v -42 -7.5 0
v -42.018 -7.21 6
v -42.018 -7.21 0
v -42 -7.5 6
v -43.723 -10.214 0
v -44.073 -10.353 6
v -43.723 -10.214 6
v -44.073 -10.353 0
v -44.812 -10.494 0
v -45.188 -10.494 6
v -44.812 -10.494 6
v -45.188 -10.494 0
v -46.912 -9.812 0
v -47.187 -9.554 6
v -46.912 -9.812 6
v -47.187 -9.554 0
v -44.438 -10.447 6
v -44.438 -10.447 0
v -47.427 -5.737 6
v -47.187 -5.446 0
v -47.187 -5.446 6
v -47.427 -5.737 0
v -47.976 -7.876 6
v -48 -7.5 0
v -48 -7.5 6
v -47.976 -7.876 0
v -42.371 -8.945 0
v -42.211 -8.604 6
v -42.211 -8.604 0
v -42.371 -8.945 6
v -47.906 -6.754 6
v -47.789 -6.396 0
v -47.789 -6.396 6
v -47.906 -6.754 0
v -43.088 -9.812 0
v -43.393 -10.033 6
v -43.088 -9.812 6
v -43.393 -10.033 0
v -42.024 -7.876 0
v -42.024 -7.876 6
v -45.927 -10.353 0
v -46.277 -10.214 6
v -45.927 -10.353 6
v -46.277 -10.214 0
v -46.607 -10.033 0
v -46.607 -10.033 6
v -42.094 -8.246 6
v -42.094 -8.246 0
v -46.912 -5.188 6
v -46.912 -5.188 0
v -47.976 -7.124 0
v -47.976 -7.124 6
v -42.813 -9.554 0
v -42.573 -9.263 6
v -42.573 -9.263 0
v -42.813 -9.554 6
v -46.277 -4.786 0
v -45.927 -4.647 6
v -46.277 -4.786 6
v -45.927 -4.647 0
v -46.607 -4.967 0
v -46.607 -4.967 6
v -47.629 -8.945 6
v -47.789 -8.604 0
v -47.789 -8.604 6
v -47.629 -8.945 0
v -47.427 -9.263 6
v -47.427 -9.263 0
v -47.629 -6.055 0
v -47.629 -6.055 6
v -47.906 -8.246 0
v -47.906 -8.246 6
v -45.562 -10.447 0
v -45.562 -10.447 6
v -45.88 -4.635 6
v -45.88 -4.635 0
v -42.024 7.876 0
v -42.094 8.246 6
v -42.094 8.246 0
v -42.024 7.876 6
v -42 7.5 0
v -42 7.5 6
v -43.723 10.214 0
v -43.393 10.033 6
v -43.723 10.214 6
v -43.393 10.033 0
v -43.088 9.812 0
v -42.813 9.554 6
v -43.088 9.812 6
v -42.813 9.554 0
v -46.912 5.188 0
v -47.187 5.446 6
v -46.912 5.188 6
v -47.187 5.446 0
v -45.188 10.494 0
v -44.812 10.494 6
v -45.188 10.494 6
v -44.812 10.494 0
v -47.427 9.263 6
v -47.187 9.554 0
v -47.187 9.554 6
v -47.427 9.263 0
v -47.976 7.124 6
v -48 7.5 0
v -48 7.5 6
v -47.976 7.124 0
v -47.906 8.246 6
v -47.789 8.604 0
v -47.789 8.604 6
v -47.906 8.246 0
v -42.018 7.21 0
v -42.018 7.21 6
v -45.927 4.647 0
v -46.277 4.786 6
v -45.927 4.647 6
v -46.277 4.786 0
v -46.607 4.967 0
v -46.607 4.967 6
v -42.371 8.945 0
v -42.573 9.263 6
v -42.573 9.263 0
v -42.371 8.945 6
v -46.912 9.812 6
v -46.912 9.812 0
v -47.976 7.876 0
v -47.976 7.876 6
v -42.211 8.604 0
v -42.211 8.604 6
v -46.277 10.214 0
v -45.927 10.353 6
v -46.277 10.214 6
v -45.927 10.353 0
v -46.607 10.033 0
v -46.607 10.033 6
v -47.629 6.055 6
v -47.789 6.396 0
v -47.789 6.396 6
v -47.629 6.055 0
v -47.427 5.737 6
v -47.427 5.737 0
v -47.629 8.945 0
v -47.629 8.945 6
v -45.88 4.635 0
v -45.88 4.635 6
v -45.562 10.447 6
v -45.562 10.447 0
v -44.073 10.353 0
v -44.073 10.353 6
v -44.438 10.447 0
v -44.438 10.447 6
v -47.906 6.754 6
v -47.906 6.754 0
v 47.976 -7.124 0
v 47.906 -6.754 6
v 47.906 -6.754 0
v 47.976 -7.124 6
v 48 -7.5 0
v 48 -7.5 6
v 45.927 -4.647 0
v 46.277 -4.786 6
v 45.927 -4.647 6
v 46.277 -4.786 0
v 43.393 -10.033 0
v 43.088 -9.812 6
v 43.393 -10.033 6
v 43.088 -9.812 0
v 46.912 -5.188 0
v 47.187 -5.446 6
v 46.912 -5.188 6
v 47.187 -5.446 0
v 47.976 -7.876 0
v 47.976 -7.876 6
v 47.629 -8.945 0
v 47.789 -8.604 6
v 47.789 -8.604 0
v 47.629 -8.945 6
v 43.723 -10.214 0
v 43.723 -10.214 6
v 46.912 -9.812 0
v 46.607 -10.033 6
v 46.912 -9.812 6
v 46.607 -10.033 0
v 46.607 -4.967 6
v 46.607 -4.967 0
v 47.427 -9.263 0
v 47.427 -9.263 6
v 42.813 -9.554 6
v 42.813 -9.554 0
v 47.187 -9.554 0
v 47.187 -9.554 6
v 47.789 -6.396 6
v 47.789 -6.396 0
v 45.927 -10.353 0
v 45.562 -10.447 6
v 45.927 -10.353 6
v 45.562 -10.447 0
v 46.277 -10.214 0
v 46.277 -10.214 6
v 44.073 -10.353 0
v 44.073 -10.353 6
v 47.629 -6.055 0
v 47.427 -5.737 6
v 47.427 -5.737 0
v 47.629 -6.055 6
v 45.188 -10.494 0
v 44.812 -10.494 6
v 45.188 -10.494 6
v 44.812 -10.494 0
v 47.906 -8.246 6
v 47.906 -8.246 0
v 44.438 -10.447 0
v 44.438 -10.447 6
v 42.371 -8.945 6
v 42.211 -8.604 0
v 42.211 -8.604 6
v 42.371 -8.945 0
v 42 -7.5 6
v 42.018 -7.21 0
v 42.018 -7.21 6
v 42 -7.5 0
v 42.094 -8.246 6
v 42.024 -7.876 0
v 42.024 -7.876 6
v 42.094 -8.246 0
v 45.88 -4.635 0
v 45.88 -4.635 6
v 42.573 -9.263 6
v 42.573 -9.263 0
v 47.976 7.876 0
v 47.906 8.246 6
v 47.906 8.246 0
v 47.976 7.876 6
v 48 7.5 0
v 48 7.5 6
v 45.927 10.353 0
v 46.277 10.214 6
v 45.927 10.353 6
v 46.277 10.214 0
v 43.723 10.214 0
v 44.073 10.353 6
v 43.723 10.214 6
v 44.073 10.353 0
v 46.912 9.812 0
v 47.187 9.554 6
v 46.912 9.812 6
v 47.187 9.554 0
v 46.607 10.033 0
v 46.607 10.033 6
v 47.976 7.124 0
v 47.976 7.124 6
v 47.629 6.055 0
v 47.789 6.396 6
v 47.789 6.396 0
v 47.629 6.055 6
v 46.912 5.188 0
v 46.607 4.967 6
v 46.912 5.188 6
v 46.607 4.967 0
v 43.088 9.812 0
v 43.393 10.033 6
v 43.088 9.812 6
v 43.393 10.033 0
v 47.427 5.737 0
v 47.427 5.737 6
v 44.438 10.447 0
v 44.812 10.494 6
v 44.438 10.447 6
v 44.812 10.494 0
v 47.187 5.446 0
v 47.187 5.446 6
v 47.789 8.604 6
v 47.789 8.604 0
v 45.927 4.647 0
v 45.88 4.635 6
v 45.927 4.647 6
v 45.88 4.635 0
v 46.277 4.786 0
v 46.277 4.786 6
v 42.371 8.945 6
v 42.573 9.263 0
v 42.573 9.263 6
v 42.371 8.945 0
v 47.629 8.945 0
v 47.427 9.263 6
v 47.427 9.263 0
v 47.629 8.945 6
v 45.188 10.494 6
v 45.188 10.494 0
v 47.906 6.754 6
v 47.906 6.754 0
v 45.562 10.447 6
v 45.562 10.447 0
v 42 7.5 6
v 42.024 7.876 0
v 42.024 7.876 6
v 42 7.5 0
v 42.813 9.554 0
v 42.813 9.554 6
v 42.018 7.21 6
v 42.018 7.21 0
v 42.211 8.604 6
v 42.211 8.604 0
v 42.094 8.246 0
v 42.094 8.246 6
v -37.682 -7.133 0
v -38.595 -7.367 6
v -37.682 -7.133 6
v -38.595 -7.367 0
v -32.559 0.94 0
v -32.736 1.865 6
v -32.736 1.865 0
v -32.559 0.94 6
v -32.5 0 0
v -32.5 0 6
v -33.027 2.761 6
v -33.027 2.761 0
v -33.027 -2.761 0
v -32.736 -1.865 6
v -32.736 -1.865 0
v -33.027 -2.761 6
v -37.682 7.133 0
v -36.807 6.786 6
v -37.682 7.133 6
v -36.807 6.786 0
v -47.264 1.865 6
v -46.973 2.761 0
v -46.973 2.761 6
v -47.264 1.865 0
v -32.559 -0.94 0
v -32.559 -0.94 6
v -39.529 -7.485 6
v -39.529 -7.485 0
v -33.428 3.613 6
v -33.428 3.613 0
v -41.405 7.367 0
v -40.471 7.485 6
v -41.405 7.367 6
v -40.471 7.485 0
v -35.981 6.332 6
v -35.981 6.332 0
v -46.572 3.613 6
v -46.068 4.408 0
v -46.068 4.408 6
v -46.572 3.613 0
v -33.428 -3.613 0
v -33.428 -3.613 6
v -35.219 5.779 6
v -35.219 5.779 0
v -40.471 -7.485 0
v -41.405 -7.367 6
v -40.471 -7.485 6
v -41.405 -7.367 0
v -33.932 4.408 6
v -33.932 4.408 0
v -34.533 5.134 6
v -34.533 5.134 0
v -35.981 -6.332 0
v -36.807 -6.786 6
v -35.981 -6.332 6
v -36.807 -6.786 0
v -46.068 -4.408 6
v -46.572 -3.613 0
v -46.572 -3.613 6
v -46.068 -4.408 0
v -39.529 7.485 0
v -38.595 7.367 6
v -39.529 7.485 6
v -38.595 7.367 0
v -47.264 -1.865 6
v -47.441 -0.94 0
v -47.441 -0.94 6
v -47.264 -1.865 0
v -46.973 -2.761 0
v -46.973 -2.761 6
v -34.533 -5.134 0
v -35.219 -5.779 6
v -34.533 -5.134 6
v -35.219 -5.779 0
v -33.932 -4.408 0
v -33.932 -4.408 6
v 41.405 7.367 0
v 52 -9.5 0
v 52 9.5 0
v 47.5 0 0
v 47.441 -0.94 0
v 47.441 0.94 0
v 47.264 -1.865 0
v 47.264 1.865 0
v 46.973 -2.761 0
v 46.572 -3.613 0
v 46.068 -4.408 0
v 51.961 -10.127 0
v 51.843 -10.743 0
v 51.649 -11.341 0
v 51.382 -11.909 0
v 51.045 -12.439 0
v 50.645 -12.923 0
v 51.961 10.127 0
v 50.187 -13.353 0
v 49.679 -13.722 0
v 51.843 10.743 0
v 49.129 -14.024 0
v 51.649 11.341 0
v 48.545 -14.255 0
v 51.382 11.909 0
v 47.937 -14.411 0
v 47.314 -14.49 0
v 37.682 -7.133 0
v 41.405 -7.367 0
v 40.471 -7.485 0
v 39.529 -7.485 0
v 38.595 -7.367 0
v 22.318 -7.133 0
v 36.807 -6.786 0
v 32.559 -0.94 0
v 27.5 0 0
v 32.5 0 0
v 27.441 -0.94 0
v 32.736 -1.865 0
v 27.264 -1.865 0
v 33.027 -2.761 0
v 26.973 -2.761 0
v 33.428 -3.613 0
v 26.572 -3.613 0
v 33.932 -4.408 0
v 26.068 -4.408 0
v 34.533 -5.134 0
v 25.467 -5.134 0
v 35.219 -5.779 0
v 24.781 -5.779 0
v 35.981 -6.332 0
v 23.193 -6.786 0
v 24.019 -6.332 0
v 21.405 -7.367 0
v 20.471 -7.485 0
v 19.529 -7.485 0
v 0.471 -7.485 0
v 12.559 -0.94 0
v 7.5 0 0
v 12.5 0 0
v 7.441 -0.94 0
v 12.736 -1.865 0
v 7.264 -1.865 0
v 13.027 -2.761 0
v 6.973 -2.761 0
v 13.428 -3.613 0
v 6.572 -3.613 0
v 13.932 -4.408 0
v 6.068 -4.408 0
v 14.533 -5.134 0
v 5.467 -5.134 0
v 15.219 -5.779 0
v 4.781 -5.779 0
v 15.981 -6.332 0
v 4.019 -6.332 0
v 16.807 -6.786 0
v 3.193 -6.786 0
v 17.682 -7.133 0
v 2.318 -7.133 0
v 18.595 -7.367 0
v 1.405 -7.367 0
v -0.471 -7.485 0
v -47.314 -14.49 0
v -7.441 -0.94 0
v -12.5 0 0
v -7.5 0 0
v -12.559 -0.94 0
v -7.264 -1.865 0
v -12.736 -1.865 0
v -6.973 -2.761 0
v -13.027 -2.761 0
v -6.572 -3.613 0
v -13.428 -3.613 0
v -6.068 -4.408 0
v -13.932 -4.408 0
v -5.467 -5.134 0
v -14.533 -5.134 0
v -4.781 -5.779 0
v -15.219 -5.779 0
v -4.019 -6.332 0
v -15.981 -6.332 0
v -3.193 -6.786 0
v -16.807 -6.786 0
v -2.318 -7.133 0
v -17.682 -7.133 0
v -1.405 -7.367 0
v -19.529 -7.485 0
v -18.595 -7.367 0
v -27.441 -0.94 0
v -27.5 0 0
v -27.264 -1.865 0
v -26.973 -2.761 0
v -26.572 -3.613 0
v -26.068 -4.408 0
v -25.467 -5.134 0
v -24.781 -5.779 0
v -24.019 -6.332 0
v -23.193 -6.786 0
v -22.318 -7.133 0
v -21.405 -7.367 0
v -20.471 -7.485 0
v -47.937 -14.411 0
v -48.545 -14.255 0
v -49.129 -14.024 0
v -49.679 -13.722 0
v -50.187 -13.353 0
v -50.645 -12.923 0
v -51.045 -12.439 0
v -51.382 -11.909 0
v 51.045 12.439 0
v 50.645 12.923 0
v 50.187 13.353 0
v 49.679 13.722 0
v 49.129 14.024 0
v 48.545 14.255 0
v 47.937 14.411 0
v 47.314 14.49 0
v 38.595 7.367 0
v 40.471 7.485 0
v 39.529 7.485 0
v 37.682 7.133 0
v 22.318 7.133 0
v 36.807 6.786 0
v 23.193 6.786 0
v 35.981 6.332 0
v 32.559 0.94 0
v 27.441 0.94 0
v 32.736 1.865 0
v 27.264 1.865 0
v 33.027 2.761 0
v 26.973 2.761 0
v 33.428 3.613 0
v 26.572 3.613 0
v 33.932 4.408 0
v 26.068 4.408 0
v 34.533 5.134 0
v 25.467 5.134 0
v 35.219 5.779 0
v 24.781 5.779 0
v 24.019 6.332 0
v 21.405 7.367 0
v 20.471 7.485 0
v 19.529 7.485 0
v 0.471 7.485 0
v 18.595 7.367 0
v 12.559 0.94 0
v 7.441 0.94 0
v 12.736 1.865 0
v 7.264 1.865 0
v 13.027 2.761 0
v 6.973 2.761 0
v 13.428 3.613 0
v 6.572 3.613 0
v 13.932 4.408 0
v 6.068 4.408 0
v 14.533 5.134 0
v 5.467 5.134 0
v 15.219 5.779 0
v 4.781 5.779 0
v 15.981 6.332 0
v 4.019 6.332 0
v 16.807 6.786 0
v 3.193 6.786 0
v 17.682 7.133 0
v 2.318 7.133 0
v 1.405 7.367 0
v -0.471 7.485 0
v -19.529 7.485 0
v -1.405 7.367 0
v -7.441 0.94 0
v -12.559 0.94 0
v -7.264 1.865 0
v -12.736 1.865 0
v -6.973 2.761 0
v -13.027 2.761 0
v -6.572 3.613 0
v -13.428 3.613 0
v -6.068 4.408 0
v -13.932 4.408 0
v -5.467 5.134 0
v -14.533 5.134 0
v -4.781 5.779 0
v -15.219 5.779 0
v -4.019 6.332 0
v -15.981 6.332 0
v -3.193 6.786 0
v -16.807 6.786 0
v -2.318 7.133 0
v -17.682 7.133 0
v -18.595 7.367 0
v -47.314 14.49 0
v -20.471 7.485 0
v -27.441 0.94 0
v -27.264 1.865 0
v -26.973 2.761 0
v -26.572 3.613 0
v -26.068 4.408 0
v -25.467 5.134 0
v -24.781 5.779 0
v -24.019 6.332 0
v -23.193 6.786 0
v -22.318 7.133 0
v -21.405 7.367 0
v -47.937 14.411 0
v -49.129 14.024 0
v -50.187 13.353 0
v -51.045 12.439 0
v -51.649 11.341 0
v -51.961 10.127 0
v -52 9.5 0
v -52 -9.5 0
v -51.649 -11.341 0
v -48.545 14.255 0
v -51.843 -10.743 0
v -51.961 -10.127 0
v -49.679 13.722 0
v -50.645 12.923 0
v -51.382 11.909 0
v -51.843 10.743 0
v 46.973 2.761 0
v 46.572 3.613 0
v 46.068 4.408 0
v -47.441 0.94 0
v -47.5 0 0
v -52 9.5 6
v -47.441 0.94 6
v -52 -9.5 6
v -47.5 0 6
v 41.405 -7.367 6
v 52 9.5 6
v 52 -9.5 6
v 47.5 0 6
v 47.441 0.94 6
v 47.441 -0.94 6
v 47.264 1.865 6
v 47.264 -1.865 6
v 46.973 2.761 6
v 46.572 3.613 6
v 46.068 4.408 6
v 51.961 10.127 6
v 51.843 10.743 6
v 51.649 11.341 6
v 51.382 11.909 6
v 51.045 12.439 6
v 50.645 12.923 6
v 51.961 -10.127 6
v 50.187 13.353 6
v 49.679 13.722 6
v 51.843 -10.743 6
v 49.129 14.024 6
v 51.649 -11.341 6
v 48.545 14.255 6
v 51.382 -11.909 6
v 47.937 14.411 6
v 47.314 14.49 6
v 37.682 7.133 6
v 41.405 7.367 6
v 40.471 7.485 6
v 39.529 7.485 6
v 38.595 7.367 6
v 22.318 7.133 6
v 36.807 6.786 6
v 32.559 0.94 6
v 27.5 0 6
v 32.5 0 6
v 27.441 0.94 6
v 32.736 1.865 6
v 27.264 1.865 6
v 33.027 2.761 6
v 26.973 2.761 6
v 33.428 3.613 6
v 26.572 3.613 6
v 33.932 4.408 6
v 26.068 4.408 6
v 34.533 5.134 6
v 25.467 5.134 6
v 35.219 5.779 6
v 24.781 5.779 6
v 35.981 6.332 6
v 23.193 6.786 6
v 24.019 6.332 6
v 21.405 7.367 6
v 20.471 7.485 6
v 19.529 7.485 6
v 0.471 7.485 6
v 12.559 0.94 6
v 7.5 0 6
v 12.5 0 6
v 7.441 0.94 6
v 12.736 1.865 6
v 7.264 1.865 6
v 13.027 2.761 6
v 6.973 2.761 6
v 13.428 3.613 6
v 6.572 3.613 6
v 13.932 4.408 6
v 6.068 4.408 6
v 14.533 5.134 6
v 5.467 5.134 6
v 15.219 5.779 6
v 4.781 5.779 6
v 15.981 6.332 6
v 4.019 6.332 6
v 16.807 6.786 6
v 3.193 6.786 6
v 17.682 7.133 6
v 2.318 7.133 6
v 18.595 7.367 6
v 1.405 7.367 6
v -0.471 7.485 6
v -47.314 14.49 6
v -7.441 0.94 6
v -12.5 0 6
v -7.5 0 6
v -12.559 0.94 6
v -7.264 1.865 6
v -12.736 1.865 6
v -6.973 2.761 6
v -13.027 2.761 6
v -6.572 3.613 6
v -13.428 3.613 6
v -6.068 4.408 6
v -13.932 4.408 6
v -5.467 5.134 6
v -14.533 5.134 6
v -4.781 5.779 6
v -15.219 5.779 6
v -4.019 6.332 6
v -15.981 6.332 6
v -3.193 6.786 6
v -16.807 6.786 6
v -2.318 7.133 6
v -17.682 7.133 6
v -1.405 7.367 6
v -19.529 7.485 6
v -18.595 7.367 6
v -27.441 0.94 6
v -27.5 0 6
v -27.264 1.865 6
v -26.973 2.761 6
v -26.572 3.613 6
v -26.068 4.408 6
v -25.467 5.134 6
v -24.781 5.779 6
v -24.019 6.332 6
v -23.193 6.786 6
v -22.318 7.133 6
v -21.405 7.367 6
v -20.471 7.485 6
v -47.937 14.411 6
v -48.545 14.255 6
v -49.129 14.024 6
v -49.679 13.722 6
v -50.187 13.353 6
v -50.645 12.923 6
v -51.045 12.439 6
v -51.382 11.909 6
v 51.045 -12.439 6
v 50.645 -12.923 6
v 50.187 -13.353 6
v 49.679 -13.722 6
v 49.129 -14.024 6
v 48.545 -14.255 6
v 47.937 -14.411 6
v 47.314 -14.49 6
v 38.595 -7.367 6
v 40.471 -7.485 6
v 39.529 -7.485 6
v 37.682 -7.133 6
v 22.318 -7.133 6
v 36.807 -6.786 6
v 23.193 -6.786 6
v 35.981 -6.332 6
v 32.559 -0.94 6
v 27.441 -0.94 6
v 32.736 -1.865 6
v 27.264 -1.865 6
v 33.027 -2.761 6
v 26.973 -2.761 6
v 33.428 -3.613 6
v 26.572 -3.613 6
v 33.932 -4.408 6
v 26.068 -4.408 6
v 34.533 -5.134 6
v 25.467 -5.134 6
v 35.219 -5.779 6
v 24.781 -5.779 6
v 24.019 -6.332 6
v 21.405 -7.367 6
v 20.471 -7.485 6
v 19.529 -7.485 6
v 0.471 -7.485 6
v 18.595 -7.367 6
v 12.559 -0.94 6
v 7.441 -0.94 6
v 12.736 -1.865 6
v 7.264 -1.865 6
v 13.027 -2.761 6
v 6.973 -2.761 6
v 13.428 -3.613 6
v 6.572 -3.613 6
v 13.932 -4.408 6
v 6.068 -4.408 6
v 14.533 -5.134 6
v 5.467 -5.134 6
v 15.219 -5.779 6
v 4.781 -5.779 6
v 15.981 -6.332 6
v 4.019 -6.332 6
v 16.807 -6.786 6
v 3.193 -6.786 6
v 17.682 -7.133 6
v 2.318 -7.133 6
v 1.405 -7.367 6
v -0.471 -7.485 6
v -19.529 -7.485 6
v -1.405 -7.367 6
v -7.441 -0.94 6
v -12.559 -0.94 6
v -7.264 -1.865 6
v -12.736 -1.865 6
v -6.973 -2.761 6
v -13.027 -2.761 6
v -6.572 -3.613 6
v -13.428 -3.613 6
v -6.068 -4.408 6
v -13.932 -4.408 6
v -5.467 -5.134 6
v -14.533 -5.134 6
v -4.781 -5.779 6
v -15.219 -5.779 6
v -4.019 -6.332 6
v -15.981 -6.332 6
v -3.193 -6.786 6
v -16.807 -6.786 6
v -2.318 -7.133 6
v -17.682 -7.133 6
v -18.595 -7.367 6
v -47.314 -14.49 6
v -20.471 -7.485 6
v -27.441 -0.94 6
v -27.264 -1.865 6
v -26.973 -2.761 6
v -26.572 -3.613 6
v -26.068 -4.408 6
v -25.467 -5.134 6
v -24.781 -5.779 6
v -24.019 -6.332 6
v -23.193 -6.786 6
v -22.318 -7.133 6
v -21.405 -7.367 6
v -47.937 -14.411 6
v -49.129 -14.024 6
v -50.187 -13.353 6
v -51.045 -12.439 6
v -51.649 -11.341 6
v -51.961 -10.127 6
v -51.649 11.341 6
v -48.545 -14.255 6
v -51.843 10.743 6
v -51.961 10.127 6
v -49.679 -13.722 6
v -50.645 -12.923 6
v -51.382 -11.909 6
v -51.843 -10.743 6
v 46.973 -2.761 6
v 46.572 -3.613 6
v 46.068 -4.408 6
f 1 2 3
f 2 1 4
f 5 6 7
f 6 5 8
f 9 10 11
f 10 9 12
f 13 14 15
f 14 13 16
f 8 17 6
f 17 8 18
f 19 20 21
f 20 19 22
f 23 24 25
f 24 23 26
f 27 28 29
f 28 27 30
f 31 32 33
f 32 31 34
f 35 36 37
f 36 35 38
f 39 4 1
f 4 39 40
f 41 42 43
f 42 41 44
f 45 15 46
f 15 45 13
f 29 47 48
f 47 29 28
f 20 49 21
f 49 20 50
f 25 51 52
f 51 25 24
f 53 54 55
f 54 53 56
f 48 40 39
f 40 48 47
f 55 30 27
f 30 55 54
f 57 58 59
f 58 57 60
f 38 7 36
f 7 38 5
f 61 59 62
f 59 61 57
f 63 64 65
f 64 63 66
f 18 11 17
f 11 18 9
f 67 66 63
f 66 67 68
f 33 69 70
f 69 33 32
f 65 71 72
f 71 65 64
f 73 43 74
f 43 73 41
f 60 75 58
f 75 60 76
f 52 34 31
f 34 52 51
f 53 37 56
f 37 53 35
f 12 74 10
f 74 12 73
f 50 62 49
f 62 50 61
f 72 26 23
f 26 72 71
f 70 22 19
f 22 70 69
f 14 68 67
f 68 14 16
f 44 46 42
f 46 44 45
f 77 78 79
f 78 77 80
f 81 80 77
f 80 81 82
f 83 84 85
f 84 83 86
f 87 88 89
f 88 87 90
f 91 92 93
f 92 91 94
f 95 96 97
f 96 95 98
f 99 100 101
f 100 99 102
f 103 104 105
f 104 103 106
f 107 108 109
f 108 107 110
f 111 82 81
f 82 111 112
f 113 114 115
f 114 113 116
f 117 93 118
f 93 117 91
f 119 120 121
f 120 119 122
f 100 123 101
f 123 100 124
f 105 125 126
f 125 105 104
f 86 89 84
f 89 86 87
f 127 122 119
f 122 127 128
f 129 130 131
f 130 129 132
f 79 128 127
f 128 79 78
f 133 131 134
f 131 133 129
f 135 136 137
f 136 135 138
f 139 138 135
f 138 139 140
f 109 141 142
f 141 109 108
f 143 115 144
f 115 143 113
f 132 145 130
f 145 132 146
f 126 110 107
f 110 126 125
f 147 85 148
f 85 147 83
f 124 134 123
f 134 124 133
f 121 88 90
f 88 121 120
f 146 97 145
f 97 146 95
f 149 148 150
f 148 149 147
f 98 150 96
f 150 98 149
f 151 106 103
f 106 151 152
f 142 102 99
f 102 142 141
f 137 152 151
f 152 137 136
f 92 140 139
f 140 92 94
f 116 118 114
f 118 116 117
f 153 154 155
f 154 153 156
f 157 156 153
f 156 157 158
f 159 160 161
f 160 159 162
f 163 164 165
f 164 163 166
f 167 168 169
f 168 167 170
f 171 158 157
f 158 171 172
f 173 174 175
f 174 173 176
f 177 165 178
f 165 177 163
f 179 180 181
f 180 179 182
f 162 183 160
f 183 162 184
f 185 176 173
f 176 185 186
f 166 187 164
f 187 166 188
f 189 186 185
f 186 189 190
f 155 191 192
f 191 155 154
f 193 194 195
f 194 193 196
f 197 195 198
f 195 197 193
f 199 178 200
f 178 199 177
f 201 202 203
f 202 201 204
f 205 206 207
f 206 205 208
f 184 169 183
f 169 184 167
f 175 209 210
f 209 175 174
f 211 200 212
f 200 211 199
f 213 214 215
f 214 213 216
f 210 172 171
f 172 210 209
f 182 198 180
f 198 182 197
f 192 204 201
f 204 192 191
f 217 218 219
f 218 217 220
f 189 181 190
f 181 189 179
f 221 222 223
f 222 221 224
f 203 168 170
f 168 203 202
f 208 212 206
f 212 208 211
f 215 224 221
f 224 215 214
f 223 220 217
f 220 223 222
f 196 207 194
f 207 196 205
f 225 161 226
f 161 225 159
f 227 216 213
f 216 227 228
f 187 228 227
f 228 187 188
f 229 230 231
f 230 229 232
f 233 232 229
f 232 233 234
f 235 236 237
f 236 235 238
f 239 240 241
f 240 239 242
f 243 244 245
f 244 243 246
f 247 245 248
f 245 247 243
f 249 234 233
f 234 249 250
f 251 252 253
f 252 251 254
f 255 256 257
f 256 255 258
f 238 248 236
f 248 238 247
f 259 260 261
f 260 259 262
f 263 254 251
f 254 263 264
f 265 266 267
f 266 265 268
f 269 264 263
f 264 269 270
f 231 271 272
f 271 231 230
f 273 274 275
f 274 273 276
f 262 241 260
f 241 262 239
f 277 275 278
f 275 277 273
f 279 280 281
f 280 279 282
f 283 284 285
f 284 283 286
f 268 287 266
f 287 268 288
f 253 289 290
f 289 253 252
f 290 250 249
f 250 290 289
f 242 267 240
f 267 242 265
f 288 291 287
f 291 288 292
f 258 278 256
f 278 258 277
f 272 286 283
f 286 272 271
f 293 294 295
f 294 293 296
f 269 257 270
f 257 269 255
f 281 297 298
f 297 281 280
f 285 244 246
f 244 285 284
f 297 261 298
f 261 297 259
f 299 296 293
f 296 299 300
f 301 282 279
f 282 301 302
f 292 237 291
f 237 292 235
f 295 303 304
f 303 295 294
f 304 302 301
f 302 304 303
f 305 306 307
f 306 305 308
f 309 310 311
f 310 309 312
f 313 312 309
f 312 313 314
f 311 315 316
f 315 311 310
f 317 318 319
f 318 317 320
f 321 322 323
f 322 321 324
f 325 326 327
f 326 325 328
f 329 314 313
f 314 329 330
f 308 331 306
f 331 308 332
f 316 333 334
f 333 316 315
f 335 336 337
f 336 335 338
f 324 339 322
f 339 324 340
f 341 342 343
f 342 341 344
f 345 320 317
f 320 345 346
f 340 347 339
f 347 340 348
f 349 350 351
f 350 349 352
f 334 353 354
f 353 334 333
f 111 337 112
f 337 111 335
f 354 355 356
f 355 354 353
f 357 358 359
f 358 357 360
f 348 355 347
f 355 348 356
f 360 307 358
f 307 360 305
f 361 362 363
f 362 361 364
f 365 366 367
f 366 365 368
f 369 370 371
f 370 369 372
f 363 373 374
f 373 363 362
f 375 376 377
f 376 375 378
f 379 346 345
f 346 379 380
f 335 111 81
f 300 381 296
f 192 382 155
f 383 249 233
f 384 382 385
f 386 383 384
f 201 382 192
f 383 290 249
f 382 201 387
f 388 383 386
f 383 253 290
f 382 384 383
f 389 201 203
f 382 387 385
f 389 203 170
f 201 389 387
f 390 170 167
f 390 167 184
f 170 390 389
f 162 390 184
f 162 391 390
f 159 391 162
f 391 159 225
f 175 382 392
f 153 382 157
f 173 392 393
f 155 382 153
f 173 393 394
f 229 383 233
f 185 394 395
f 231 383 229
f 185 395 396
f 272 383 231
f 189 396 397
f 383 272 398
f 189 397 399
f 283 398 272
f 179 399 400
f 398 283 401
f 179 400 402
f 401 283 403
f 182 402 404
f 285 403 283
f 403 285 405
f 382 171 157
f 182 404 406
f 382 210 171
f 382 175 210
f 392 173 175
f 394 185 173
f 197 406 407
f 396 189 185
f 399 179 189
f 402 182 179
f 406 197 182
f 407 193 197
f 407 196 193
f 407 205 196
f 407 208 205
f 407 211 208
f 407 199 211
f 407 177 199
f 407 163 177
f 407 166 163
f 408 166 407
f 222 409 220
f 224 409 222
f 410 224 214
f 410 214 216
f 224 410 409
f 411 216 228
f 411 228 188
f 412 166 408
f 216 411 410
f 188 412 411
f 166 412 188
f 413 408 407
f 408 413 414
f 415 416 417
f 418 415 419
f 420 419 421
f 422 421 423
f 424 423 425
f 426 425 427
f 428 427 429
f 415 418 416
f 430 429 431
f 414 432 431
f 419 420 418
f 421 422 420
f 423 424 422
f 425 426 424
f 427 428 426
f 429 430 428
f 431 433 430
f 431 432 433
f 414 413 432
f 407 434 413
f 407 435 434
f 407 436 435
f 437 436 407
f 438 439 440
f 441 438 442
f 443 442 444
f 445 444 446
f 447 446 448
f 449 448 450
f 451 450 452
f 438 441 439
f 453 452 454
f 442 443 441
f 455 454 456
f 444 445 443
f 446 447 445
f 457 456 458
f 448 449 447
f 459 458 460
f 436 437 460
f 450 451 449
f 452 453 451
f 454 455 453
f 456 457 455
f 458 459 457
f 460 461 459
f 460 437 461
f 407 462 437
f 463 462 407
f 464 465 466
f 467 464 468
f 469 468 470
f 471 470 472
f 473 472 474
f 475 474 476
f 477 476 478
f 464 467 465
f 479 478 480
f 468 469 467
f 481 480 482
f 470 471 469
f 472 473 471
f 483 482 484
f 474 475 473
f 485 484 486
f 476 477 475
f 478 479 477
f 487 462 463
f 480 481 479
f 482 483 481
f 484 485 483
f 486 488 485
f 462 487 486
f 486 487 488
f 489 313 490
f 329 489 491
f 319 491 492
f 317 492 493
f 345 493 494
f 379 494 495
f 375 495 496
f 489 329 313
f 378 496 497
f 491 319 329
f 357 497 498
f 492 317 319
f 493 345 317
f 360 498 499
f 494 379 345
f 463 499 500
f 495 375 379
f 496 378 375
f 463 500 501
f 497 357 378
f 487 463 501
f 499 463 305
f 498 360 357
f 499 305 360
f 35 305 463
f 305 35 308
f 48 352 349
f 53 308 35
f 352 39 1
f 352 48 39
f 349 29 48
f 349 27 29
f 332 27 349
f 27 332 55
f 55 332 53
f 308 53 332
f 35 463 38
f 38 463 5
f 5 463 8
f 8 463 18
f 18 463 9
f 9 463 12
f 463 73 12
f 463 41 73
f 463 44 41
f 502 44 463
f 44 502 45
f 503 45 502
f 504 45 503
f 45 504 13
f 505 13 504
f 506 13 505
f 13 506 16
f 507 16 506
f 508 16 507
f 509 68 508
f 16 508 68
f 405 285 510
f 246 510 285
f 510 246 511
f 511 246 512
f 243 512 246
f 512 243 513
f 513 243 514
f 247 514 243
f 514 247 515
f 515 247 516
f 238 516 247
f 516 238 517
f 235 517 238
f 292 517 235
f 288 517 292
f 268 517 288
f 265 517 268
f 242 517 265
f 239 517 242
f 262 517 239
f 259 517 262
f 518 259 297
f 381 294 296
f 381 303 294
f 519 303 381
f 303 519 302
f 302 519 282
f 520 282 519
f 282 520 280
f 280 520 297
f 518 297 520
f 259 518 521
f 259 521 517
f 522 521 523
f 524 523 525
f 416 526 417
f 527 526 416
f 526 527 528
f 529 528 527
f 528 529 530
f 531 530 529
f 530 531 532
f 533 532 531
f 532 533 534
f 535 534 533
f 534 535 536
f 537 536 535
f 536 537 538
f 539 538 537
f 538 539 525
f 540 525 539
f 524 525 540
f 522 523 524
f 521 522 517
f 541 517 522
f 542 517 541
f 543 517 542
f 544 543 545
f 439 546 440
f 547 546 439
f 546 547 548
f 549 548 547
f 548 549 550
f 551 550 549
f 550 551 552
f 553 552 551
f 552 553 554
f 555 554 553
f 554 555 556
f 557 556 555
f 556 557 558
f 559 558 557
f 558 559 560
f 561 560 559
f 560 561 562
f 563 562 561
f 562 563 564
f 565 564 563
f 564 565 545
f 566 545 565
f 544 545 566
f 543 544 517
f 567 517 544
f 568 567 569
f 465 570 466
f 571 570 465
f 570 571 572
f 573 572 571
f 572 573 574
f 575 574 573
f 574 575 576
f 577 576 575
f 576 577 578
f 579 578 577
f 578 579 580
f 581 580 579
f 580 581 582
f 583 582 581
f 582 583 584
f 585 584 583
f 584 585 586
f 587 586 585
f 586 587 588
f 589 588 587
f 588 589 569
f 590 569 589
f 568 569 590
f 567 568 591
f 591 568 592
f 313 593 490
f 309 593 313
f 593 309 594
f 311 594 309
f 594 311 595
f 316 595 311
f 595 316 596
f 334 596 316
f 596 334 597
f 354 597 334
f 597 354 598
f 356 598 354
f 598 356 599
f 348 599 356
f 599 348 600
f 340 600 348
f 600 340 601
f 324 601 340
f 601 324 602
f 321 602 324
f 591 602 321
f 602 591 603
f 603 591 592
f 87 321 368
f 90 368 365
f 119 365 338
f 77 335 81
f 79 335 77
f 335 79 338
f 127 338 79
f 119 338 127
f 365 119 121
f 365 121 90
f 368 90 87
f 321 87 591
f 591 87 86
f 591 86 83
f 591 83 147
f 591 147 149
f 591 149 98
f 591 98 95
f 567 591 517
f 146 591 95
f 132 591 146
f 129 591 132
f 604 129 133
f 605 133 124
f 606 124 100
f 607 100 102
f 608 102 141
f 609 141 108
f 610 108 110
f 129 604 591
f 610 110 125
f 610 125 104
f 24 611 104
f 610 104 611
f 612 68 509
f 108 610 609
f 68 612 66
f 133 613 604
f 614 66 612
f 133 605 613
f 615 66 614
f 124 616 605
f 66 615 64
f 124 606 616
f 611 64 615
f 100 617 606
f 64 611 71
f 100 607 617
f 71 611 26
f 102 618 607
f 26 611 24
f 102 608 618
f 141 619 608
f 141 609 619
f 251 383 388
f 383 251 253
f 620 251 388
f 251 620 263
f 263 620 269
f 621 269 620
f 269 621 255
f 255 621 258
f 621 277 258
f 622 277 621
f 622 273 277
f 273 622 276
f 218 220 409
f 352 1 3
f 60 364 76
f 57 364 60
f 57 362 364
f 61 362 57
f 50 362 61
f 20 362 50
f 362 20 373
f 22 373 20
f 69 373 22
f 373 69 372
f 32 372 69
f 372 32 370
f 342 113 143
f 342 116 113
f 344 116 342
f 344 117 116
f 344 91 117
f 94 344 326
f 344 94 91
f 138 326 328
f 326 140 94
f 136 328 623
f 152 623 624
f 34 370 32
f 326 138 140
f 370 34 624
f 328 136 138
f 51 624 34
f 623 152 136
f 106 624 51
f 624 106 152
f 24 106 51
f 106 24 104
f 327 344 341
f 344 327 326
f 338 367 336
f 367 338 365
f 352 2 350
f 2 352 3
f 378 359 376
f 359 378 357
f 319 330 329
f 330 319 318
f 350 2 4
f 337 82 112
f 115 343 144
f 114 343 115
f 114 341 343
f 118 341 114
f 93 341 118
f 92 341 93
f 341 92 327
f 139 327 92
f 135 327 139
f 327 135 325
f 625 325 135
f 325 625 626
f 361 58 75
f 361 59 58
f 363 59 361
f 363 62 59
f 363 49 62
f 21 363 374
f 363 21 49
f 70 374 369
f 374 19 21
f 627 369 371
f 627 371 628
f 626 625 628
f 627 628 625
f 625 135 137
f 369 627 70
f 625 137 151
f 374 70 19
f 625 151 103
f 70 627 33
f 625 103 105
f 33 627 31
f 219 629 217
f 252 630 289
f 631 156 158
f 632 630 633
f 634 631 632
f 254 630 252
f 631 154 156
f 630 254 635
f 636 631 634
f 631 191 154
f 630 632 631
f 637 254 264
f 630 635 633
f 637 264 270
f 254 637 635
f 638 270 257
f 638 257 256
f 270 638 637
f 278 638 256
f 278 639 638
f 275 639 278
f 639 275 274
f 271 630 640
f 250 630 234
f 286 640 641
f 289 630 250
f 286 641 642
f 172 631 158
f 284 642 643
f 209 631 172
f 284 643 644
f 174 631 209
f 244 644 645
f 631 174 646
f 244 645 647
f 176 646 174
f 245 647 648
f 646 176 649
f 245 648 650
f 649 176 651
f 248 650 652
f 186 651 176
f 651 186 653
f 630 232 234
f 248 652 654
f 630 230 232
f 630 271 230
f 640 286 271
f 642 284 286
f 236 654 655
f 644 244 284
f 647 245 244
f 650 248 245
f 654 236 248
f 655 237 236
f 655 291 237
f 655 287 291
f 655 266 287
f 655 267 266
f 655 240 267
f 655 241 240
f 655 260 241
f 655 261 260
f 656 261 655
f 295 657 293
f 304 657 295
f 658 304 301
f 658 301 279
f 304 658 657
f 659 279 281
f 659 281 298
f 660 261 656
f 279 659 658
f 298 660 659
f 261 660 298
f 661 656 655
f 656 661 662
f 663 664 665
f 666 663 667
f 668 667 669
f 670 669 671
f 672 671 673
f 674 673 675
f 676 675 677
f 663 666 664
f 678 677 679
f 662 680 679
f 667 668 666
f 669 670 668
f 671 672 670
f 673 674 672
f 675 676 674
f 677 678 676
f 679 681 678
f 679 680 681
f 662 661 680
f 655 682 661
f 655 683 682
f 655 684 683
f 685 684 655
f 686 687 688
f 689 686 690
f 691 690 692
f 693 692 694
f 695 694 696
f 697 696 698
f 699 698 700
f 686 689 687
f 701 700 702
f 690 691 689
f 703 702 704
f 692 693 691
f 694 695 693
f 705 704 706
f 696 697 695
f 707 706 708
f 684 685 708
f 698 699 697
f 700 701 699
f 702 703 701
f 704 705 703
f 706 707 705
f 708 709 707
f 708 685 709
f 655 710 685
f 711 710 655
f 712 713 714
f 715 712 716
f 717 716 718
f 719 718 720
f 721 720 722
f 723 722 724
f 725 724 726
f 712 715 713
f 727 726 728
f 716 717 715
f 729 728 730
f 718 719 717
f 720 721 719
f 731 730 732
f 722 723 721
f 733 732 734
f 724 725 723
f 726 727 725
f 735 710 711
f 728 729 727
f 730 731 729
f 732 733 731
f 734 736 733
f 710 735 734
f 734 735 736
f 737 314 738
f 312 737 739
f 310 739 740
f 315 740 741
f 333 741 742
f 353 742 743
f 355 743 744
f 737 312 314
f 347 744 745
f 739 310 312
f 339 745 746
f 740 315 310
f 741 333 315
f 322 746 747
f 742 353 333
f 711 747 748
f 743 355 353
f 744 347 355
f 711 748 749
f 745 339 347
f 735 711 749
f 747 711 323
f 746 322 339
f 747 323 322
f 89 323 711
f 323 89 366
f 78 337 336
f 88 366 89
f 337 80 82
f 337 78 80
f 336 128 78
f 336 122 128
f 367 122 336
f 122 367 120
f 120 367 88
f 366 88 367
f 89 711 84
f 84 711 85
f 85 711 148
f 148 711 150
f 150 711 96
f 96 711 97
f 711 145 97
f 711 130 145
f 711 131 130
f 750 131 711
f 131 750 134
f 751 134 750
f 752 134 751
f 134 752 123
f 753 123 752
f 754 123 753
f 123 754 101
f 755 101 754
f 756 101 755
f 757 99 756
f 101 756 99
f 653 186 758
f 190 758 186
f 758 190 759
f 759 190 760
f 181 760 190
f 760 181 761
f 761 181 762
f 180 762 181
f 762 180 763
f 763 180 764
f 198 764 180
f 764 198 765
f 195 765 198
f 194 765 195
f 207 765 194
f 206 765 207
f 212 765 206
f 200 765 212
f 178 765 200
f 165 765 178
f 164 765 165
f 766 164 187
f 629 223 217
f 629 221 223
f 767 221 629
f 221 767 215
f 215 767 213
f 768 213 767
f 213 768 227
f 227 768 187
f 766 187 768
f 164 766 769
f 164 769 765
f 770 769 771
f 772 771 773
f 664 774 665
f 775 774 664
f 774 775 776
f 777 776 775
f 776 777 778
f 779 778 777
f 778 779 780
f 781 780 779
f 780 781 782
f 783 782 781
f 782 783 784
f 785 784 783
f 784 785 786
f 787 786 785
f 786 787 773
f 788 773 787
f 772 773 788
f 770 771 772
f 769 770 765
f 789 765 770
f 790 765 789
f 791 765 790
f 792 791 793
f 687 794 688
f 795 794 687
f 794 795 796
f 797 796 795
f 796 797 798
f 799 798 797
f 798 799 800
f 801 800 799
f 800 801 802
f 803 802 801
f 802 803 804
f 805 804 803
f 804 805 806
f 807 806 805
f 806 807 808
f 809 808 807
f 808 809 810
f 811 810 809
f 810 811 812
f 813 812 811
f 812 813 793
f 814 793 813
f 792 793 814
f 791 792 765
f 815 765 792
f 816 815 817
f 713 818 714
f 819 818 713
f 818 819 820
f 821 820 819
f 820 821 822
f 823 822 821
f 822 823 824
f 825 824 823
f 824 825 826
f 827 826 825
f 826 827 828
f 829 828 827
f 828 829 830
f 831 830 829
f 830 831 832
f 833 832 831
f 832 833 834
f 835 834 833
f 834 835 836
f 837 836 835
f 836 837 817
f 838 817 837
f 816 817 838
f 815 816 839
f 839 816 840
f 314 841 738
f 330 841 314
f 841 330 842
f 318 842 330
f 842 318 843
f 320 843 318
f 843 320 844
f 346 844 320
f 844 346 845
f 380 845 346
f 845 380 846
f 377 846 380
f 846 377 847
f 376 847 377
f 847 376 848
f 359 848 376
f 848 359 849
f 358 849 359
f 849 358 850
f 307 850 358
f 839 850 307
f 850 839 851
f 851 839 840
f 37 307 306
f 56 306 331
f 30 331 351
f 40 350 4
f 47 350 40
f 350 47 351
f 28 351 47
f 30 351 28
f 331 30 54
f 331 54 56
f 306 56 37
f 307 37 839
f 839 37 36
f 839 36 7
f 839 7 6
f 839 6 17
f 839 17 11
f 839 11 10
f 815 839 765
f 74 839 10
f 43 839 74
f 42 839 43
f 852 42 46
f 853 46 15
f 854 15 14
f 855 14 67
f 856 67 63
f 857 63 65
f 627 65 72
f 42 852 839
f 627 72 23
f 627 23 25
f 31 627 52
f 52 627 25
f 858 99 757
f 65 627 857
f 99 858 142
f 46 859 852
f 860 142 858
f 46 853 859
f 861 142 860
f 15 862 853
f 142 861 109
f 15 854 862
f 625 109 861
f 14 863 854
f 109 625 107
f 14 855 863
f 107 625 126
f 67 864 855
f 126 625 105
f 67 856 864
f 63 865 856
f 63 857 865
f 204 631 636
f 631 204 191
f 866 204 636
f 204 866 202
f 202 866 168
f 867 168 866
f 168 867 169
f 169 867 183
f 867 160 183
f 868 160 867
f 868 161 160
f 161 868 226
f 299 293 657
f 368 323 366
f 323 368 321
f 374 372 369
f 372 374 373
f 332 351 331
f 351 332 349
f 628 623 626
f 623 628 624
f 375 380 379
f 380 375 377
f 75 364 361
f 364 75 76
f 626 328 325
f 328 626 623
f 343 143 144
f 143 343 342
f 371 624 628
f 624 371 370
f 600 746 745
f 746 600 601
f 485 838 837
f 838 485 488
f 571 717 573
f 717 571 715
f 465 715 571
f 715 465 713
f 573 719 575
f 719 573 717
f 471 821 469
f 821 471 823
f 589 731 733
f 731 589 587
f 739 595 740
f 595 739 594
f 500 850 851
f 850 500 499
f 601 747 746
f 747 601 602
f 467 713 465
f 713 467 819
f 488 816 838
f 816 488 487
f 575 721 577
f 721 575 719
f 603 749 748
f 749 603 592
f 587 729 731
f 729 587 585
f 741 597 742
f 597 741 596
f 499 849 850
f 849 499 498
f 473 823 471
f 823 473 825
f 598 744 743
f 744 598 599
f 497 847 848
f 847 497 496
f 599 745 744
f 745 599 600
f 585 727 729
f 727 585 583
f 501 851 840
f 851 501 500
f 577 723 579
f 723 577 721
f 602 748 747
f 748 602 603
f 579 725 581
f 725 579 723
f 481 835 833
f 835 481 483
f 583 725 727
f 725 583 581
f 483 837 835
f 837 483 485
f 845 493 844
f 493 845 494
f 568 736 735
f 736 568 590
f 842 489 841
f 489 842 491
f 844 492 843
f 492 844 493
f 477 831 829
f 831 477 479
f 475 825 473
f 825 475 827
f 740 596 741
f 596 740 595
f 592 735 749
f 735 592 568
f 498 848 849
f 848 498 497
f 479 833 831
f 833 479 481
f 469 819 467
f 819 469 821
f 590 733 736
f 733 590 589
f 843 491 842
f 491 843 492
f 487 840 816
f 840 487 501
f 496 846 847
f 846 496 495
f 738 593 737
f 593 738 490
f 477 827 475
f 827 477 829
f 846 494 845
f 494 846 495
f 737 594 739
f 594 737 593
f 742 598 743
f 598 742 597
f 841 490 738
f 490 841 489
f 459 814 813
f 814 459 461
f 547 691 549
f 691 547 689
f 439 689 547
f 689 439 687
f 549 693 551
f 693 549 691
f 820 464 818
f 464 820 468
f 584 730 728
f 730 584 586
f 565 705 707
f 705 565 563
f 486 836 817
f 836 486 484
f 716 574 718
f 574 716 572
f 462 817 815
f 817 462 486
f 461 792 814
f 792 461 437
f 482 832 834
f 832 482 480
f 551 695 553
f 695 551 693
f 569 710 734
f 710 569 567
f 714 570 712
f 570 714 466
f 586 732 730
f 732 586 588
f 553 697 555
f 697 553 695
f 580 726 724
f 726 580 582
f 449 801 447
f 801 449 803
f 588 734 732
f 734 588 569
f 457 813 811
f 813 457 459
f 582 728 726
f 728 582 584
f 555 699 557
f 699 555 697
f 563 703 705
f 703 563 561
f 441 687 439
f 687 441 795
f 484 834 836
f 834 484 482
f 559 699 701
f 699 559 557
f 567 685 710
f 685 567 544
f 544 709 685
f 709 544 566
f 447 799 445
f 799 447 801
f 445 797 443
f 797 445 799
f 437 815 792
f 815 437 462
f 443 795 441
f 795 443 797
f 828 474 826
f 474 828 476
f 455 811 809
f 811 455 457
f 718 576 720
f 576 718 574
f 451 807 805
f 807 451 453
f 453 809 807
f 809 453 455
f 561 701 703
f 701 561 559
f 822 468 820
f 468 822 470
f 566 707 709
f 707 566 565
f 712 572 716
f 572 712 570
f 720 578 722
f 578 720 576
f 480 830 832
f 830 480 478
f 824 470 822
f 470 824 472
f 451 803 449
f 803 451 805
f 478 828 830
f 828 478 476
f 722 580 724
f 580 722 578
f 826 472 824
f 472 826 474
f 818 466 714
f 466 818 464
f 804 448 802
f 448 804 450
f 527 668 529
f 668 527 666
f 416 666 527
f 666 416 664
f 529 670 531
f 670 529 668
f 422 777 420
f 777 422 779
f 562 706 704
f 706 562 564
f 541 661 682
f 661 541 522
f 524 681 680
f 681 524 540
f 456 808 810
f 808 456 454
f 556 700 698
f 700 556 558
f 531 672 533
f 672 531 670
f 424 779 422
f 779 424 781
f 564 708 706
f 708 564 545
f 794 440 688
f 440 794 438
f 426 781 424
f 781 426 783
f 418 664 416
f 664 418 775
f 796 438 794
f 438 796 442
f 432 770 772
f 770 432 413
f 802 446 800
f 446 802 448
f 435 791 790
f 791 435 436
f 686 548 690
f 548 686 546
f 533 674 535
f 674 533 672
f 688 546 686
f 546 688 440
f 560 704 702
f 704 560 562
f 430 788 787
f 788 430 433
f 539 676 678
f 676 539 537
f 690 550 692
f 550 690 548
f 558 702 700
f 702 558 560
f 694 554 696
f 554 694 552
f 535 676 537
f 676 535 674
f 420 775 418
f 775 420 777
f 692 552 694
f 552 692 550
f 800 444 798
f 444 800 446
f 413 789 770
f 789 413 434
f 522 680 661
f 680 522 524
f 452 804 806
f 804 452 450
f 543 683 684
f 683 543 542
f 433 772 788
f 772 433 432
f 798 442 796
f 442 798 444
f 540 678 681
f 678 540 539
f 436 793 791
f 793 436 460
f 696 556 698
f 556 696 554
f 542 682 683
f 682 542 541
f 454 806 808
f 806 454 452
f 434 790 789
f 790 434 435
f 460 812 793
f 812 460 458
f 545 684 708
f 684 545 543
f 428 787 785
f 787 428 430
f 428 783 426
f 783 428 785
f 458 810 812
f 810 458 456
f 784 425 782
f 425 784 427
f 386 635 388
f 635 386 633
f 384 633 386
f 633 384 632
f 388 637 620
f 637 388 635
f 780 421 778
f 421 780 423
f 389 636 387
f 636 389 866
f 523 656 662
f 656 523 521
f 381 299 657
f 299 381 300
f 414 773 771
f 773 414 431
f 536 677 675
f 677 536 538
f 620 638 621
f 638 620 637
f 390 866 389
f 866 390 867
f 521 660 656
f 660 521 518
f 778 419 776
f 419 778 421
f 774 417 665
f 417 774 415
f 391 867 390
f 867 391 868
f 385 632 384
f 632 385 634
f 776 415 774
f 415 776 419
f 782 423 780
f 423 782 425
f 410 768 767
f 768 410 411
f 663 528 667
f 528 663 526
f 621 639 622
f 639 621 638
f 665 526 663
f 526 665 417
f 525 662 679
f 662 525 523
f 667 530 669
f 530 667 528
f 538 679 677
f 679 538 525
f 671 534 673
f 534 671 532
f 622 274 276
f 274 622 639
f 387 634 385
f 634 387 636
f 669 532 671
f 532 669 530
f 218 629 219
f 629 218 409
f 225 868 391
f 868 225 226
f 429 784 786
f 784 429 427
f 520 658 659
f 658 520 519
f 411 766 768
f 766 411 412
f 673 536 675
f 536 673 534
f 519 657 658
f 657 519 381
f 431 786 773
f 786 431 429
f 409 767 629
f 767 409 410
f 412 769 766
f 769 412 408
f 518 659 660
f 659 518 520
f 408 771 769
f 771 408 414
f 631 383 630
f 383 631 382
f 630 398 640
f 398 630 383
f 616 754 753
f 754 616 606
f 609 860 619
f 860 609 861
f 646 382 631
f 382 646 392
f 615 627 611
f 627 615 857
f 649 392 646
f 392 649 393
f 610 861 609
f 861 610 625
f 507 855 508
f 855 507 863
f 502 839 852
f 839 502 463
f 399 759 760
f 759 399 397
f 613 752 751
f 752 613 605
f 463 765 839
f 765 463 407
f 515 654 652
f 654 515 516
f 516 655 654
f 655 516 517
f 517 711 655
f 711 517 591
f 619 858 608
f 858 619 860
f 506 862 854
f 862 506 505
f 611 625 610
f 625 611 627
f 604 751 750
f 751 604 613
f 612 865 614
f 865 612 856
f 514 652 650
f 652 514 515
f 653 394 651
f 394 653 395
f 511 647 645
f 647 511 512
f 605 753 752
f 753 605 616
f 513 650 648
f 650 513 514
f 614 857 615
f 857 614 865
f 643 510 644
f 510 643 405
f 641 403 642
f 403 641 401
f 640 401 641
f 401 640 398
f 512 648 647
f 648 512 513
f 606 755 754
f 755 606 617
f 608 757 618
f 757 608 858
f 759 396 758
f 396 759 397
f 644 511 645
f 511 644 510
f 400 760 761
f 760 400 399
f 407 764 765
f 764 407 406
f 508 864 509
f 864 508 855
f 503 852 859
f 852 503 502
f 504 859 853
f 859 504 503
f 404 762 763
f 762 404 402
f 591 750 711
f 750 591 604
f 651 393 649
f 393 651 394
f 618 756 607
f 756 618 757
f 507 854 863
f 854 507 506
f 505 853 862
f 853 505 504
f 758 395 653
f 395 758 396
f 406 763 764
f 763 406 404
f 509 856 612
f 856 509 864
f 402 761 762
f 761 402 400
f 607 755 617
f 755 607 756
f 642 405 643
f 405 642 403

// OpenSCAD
$fn = 50;


difference() {
	union() {
		hull() {
			translate(v = [-47.0000000000, 9.5000000000, 0]) {
				cylinder(h = 6, r = 5);
			}
			translate(v = [47.0000000000, 9.5000000000, 0]) {
				cylinder(h = 6, r = 5);
			}
			translate(v = [-47.0000000000, -9.5000000000, 0]) {
				cylinder(h = 6, r = 5);
			}
			translate(v = [47.0000000000, -9.5000000000, 0]) {
				cylinder(h = 6, r = 5);
			}
		}
	}
	union() {
		#translate(v = [-45.0000000000, -7.5000000000, -100.0000000000]) {
			cylinder(h = 200, r = 3.0000000000);
		}
		#translate(v = [-45.0000000000, 7.5000000000, -100.0000000000]) {
			cylinder(h = 200, r = 3.0000000000);
		}
		#translate(v = [45.0000000000, -7.5000000000, -100.0000000000]) {
			cylinder(h = 200, r = 3.0000000000);
		}
		#translate(v = [45.0000000000, 7.5000000000, -100.0000000000]) {
			cylinder(h = 200, r = 3.0000000000);
		}
		#translate(v = [-40.0000000000, 0, 0]) {
			cylinder(h = 6, r = 7.5000000000);
		}
		#translate(v = [-20.0000000000, 0, 0]) {
			cylinder(h = 6, r = 7.5000000000);
		}
		#cylinder(h = 6, r = 7.5000000000);
		#translate(v = [20.0000000000, 0, 0]) {
			cylinder(h = 6, r = 7.5000000000);
		}
		#translate(v = [40.0000000000, 0, 0]) {
			cylinder(h = 6, r = 7.5000000000);
		}
	}
}
